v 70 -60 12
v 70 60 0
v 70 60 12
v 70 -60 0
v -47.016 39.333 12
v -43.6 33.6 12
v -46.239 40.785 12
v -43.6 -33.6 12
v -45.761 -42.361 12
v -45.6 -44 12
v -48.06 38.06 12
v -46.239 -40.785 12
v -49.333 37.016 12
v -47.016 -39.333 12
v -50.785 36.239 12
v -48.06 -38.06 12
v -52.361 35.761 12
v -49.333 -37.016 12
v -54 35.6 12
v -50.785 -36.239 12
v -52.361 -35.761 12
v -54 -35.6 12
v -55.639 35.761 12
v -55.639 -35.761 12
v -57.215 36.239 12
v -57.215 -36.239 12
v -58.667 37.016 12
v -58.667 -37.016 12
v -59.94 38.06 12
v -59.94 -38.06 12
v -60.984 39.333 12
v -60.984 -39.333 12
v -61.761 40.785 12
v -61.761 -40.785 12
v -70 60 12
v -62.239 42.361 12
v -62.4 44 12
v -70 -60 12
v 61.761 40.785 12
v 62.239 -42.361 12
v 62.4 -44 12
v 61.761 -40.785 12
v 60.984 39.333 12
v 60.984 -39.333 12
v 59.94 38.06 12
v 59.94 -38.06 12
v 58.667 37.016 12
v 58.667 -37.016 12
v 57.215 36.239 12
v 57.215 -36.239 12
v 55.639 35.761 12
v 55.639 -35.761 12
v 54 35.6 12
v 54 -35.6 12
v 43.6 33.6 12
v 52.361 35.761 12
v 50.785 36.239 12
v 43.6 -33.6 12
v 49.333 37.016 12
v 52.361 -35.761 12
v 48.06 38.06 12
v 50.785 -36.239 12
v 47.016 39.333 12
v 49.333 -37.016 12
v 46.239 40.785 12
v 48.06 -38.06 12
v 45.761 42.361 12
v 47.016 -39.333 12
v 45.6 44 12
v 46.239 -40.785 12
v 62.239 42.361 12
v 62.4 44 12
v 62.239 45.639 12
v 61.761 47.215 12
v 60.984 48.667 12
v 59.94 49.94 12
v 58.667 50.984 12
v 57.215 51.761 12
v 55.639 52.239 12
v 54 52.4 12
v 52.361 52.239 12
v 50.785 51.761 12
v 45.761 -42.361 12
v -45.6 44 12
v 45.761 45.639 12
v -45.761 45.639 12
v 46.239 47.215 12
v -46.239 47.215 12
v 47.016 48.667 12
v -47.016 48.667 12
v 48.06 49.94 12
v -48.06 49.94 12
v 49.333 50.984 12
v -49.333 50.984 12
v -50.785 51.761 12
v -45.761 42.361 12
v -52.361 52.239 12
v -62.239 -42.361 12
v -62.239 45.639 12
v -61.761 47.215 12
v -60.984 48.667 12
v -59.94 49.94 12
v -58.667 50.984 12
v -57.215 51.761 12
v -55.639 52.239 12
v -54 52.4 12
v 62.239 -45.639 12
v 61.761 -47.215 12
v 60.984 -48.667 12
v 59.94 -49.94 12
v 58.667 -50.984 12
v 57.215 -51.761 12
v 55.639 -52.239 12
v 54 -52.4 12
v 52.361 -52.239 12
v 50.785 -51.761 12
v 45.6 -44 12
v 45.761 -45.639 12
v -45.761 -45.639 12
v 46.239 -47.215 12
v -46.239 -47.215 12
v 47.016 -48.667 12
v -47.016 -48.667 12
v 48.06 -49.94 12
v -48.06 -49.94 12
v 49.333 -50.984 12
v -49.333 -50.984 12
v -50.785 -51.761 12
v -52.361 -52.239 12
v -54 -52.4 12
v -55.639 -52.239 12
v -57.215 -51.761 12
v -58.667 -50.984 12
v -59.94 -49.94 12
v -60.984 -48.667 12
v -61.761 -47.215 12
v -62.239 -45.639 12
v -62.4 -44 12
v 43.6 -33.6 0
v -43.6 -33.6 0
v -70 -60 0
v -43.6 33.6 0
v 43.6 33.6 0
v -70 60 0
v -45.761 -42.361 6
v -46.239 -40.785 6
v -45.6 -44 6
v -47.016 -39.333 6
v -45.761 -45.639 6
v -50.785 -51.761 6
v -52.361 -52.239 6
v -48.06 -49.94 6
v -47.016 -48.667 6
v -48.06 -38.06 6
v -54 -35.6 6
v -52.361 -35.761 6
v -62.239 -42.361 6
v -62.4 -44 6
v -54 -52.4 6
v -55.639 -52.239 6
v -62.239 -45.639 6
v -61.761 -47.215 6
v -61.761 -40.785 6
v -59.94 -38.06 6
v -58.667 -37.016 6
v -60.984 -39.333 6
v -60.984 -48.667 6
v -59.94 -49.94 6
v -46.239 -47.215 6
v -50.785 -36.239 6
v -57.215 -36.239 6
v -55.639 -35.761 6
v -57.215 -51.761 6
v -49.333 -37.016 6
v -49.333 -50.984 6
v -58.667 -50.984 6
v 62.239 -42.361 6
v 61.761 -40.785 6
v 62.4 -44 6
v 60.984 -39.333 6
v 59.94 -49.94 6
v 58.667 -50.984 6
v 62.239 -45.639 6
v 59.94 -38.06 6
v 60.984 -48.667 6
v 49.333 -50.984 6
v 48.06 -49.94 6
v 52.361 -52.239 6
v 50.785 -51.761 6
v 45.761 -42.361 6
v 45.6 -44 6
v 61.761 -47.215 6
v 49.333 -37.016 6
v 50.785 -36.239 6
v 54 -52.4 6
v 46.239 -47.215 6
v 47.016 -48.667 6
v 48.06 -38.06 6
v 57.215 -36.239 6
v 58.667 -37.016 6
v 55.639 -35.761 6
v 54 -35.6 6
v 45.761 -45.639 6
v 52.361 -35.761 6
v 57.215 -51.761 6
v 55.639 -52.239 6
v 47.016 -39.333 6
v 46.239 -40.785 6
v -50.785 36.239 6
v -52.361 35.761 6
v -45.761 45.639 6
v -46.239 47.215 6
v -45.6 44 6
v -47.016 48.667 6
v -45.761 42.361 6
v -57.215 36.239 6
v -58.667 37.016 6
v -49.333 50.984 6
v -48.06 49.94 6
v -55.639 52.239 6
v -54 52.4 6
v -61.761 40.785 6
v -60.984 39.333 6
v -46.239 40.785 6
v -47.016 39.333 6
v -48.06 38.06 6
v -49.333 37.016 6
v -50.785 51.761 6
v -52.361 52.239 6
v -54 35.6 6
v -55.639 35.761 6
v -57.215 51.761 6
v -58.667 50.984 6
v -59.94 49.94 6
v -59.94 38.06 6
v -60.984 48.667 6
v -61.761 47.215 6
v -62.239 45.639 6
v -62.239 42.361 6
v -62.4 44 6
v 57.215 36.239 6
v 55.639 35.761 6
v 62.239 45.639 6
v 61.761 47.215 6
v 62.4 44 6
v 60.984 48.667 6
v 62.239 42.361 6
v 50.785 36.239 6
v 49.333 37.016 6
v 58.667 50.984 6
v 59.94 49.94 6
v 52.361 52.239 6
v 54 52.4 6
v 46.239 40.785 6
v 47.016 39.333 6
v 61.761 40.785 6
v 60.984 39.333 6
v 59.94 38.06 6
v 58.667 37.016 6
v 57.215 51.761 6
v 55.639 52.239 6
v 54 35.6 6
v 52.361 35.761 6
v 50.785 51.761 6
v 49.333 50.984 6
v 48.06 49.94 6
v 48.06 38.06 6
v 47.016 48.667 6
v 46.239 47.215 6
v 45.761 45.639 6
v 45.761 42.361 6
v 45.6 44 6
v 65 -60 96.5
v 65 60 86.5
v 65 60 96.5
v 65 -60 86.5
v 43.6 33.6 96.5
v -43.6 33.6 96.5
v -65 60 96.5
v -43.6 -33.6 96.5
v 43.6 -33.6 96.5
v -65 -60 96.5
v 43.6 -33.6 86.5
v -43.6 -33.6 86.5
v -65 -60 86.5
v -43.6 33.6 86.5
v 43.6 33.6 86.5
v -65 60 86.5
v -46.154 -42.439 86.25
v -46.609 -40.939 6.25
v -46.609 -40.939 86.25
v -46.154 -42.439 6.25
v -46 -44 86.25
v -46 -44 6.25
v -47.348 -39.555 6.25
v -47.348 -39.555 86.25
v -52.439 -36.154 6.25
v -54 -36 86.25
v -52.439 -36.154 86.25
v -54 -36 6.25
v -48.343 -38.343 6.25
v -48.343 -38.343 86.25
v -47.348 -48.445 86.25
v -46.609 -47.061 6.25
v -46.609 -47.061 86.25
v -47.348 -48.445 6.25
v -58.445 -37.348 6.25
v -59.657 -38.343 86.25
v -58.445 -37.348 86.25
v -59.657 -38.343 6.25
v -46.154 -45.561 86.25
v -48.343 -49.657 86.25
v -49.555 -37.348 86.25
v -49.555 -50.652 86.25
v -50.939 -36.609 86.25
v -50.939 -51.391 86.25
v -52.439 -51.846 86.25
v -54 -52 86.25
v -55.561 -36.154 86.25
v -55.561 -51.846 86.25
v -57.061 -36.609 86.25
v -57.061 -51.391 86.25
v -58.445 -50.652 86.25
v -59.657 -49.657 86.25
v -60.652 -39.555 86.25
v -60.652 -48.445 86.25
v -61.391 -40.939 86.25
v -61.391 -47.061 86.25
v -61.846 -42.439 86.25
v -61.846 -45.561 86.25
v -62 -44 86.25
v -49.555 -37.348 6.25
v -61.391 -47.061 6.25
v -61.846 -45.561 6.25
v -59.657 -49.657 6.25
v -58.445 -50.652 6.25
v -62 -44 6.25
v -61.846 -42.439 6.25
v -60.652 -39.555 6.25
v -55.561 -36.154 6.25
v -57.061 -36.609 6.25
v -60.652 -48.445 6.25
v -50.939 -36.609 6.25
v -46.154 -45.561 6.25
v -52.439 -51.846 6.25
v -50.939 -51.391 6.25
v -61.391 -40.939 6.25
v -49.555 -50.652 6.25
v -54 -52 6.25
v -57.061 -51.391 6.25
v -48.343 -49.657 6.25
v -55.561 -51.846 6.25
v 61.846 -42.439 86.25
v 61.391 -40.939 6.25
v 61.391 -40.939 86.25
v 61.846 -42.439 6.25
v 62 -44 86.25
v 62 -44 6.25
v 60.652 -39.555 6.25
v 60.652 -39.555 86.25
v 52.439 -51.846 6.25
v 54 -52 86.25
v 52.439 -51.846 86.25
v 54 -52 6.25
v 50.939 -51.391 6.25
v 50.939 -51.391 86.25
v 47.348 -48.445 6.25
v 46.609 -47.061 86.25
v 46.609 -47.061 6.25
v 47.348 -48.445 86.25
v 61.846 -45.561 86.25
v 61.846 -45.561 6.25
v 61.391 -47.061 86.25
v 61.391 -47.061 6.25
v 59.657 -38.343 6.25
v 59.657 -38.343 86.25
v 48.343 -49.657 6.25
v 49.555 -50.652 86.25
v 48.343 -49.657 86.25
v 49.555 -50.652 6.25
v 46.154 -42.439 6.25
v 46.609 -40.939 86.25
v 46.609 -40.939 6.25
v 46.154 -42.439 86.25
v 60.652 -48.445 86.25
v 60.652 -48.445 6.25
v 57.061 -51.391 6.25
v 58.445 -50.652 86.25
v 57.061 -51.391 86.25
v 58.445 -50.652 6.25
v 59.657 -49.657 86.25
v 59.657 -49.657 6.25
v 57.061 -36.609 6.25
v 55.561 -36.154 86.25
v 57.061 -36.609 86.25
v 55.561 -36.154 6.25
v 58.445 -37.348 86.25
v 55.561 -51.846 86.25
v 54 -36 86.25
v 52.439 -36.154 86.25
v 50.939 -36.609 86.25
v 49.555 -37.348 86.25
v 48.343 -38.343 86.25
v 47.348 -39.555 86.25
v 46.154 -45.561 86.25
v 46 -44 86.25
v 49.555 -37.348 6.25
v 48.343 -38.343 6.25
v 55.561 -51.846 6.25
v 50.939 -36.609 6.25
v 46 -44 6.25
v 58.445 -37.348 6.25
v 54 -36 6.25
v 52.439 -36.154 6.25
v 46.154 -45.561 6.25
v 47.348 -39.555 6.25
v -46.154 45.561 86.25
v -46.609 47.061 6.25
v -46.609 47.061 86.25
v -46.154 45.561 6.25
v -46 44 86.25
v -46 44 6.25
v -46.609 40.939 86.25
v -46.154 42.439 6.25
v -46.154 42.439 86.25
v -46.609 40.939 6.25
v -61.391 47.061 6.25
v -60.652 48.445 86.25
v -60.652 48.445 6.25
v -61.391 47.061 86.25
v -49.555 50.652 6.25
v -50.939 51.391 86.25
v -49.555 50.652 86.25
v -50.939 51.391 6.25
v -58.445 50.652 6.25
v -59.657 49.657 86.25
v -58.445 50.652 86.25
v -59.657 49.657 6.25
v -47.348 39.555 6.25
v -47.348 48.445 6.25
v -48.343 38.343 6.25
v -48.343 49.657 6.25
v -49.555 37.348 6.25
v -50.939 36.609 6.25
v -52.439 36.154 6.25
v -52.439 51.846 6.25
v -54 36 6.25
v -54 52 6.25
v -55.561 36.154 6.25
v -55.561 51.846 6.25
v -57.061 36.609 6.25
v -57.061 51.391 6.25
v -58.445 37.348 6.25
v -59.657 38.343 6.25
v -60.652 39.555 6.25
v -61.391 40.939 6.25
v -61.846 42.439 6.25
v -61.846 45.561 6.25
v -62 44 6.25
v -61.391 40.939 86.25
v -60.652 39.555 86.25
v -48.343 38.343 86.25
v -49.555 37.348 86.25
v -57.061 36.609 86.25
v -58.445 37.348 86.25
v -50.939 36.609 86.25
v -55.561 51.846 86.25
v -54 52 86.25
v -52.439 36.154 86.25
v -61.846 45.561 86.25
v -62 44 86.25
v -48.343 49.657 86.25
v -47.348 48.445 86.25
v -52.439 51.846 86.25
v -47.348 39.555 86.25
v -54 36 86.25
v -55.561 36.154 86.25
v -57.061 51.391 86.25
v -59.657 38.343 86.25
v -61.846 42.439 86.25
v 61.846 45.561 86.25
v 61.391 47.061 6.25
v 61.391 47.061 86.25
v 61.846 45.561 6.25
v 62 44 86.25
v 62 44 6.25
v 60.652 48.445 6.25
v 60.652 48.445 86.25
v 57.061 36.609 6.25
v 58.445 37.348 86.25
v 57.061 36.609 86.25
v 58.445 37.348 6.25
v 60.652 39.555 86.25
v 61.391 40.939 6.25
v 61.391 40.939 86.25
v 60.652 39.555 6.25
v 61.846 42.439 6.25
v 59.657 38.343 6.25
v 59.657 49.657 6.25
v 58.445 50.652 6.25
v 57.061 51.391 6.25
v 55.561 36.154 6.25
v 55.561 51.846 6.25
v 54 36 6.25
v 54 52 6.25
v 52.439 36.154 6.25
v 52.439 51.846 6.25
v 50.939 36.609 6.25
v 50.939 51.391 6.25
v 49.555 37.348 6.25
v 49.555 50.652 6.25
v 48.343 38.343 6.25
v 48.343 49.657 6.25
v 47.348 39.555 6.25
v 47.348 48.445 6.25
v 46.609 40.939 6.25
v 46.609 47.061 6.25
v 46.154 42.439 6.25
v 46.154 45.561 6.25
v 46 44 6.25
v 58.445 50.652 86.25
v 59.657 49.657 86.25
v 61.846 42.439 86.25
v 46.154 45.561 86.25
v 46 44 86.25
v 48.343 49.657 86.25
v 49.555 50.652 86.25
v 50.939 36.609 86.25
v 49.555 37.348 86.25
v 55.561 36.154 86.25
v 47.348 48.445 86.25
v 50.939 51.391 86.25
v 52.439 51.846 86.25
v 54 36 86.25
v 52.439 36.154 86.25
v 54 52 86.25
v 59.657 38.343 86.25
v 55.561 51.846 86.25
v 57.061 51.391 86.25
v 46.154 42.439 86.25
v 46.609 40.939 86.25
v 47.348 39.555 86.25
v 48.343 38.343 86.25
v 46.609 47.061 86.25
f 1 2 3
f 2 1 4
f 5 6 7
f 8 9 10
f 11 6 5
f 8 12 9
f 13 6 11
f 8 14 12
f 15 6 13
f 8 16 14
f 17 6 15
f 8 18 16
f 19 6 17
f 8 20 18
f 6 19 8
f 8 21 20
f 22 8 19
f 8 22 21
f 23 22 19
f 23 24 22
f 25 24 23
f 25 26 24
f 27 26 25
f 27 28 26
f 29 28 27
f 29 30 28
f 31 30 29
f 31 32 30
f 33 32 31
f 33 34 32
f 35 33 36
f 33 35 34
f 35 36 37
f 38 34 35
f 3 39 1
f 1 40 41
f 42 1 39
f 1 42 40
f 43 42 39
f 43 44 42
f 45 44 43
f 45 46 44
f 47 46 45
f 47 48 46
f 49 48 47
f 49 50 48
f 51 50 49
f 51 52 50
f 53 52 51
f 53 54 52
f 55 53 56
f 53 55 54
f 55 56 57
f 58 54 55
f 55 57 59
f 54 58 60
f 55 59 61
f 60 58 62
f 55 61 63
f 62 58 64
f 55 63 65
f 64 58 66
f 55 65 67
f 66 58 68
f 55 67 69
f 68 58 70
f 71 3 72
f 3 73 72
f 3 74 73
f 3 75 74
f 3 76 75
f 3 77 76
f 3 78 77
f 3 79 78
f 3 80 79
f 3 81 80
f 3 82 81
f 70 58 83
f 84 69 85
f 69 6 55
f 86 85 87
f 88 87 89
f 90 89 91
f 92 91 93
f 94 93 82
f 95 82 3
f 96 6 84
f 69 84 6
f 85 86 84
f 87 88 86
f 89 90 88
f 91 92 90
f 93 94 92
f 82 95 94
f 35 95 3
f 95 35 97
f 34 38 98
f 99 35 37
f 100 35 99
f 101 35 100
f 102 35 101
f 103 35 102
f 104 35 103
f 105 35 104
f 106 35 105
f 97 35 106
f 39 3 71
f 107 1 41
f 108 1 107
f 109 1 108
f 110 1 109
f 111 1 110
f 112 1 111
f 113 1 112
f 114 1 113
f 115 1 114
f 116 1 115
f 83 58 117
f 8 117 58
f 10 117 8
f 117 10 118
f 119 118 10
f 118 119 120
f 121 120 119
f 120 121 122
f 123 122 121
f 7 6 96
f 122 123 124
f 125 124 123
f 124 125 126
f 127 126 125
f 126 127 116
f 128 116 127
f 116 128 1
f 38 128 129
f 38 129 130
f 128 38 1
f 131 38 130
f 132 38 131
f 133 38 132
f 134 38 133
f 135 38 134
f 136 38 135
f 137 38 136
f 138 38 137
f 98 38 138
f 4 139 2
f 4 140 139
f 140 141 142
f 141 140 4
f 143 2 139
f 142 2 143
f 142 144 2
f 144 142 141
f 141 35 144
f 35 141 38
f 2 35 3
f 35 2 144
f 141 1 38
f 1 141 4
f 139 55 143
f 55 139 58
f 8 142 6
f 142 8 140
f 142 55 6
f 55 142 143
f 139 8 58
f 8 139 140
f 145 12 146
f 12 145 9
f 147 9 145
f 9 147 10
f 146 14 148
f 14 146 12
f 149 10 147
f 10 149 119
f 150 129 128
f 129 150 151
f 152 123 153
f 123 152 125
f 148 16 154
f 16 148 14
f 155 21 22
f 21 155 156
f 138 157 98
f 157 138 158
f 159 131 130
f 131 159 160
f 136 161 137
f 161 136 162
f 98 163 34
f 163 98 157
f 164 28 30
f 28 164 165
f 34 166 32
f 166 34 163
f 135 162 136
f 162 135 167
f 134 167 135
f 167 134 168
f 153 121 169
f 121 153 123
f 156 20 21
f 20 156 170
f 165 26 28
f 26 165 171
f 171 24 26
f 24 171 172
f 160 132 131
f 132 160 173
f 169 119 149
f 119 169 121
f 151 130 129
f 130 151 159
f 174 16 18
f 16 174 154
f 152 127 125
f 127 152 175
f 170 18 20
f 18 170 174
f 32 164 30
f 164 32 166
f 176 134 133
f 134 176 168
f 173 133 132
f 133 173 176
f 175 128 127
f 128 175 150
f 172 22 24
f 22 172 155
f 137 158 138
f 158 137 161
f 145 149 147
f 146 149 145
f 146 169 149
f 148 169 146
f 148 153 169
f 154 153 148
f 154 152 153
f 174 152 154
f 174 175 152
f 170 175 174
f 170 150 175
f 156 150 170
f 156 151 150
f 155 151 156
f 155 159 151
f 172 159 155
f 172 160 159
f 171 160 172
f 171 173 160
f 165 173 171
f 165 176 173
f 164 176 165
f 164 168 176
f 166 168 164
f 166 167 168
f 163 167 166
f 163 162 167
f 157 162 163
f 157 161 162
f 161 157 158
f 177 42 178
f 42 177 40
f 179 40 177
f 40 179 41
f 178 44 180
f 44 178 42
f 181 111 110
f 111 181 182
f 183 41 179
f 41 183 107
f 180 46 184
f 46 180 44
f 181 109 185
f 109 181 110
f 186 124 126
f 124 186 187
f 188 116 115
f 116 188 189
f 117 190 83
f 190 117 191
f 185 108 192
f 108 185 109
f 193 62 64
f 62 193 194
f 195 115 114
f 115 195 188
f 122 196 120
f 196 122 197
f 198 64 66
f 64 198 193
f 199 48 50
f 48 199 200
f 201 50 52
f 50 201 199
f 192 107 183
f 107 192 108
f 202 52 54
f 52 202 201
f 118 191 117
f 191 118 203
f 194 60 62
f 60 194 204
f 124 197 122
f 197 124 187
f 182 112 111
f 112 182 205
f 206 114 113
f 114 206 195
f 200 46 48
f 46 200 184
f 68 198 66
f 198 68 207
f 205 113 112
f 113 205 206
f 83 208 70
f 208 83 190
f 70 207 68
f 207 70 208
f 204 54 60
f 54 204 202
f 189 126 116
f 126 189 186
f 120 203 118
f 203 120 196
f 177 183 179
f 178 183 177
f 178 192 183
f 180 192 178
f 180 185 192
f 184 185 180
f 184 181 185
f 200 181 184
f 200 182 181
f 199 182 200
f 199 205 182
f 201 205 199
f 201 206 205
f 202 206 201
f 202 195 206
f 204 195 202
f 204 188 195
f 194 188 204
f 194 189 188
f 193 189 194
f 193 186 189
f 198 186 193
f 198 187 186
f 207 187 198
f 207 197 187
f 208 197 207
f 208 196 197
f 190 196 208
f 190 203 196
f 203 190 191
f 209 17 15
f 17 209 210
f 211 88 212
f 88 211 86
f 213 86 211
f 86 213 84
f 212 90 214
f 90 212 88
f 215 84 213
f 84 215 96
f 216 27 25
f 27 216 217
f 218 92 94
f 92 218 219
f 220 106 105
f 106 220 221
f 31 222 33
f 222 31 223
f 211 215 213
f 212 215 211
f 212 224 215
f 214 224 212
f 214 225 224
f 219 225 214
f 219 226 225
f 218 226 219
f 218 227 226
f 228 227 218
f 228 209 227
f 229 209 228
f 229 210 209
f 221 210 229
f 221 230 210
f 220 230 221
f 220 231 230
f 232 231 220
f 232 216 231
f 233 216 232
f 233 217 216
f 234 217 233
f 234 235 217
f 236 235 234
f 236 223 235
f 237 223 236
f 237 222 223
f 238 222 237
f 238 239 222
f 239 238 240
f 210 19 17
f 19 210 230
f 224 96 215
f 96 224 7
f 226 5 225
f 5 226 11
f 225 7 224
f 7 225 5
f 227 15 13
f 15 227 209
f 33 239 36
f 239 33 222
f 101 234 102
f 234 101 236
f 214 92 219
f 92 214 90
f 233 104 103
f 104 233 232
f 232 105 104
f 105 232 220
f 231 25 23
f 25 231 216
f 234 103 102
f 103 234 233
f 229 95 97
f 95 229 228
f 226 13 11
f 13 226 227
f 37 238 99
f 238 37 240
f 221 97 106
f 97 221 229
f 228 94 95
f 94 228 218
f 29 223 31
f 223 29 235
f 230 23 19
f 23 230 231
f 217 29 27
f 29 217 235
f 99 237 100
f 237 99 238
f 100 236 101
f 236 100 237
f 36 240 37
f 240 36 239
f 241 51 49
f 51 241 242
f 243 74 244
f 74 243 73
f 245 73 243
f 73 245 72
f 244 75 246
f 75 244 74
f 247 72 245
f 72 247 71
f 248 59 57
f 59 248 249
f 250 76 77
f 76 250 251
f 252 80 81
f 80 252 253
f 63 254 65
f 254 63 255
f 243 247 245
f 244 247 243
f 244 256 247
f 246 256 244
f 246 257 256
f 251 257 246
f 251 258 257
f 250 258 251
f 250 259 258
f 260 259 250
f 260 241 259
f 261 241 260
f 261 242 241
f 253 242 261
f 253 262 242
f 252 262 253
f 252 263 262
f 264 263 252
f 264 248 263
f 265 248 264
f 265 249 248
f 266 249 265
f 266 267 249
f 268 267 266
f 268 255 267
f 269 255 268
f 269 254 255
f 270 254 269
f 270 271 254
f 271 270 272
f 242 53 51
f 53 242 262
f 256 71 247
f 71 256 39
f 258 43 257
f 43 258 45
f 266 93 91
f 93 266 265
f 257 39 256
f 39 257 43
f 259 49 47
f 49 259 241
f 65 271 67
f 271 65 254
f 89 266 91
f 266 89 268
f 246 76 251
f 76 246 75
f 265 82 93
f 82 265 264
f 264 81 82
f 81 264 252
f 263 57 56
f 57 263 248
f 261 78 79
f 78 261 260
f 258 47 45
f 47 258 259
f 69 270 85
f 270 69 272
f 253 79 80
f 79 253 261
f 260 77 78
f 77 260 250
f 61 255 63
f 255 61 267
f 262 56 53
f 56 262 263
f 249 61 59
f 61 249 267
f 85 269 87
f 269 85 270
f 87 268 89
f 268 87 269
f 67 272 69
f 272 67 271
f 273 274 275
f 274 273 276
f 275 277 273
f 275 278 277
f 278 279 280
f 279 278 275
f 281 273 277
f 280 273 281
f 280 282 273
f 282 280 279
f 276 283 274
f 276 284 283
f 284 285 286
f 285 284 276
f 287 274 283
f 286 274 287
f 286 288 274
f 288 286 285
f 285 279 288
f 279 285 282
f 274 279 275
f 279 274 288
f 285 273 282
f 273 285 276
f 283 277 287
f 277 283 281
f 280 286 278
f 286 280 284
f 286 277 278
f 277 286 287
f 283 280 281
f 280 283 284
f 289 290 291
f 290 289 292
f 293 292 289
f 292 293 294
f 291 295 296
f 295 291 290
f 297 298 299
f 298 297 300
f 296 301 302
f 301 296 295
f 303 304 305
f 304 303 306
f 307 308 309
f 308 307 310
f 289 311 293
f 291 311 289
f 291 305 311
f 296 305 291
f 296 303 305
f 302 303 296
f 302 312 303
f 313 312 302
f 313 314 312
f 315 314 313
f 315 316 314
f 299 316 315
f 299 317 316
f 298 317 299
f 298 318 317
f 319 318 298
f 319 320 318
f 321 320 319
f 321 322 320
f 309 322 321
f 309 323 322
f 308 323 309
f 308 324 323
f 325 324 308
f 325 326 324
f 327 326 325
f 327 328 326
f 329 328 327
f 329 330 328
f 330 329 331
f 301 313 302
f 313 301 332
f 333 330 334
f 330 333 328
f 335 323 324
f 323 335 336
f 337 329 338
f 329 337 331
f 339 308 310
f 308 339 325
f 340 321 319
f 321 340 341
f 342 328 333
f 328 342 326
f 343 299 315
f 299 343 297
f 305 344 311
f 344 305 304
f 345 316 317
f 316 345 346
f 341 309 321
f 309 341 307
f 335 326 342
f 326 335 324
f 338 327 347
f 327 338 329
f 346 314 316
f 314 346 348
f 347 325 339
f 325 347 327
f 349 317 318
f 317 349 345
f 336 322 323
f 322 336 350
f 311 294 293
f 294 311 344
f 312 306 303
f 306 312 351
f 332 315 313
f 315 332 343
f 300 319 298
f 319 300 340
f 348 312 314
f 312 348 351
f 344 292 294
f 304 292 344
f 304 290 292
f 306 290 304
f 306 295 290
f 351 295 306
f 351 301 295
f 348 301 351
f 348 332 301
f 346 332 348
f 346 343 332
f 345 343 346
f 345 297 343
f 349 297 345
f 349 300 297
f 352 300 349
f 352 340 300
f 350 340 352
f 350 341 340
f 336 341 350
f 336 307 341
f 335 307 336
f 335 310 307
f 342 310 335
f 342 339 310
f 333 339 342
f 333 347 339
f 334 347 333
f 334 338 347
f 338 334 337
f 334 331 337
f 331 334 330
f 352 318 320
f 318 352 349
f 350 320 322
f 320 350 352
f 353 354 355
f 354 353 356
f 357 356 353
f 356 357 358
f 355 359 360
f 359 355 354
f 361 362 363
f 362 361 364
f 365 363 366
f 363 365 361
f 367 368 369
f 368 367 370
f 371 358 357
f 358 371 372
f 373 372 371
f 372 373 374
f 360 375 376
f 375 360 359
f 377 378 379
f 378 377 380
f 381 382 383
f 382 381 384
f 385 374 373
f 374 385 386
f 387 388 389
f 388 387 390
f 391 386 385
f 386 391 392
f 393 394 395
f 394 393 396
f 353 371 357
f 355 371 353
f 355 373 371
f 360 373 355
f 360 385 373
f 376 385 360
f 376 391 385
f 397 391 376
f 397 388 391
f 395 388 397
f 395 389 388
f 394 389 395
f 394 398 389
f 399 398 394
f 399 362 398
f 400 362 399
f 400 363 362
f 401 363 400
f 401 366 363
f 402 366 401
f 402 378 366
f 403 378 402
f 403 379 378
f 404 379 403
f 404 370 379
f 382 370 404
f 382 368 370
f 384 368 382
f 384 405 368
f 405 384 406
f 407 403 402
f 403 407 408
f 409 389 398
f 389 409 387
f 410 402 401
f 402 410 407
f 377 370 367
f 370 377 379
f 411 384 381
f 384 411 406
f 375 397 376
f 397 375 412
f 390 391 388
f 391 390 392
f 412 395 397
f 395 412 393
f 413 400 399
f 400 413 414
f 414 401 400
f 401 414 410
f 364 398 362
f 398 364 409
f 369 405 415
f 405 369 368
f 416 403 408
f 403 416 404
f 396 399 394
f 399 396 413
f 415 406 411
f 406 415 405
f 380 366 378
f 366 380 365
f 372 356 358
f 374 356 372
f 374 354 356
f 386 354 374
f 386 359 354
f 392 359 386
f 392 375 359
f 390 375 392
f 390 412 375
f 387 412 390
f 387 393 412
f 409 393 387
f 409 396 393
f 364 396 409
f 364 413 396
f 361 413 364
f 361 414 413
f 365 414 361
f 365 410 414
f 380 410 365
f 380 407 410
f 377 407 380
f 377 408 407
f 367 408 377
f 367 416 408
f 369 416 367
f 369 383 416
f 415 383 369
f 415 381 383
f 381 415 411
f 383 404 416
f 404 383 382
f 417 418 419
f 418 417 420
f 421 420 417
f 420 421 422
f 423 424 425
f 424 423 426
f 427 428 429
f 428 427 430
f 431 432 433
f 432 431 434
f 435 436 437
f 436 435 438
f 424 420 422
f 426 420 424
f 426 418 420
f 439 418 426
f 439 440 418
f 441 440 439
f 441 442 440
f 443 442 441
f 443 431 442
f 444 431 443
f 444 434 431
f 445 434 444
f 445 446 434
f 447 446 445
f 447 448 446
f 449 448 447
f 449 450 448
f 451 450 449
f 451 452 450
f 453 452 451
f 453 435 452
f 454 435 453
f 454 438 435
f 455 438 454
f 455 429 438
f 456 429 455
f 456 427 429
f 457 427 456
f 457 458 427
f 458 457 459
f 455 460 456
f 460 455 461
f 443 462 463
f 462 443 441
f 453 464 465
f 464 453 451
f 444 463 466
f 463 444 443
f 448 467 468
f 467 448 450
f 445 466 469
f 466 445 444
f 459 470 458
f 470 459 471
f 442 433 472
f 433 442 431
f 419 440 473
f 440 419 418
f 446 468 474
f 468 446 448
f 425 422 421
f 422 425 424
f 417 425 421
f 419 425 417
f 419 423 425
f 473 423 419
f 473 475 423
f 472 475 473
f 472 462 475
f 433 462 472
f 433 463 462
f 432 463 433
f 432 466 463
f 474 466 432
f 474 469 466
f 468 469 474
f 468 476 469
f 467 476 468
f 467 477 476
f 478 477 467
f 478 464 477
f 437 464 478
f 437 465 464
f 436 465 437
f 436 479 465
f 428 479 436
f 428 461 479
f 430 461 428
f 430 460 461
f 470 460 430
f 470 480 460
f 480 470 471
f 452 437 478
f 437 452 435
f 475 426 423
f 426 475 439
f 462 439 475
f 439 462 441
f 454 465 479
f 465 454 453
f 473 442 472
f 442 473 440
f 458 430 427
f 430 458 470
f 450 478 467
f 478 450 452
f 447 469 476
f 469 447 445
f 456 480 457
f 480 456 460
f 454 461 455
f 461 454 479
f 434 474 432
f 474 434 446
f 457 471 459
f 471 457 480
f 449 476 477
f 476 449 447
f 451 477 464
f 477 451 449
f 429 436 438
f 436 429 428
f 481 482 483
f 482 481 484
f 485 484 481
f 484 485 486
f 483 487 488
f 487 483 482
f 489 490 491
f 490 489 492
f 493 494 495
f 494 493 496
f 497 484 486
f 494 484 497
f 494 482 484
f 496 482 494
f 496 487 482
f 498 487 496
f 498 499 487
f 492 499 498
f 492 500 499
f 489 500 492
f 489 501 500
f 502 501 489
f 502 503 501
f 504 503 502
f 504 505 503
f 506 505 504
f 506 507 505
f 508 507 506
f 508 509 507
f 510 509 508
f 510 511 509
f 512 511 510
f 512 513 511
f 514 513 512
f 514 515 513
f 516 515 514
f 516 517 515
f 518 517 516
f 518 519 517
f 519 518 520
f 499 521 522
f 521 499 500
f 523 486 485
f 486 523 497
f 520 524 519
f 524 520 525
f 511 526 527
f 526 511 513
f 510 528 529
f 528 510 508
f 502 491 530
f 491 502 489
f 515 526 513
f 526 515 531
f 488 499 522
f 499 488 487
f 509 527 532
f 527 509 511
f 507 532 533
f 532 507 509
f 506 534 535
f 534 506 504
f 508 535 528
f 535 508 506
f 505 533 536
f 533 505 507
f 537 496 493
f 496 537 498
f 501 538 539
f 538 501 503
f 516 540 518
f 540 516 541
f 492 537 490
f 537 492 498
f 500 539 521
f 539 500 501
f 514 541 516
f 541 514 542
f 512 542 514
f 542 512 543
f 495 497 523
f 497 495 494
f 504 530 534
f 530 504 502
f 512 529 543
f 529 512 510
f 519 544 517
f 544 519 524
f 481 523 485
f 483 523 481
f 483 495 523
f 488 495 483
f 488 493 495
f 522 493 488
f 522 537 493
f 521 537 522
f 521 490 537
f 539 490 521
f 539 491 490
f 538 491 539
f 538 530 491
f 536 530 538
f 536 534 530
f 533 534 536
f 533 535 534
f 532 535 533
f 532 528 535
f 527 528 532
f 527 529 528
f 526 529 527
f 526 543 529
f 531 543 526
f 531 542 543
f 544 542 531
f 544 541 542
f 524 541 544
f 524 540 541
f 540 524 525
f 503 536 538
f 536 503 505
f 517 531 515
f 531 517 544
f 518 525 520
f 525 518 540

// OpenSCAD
$fn = 32;

// ------------------------------------------------------------------------
// Frame cube: base 140 x 120 mm, posts 80 mm tall
// Every part is its own module, assembly() places every instance.
// ------------------------------------------------------------------------

// --- part 1 ---
module base_frame() {
  difference() {
    translate([-70, -60, 0]) cube([140, 120, 12]);
    translate([-43.6, -33.6, -1]) cube([87.2, 67.2, 14]);
    translate([-54, -44, 6]) cylinder(h = 7, d = 16.8);
    translate([54, -44, 6]) cylinder(h = 7, d = 16.8);
    translate([-54, 44, 6]) cylinder(h = 7, d = 16.8);
    translate([54, 44, 6]) cylinder(h = 7, d = 16.8);
  }
}

// --- part 2 ---
module corner_post() {
  cylinder(h = 80, d = 16);
}

// --- part 3 ---
module top_frame() {
  difference() {
    translate([-65, -60, 0]) cube([130, 120, 10]);
    translate([-43.6, -33.6, -1]) cube([87.2, 67.2, 12]);
  }
}

// --- assembly ---
module assembly() {
  color([0.80, 0.24, 0.20]) translate([0, 0, 0]) rotate([0, 0, 0]) base_frame();
  color([0.20, 0.45, 0.75]) translate([-54, -44, 6.25]) rotate([0, 0, 0]) corner_post();
  color([0.25, 0.62, 0.32]) translate([54, -44, 6.25]) rotate([0, 0, 0]) corner_post();
  color([0.92, 0.70, 0.18]) translate([-54, 44, 6.25]) rotate([0, 0, 0]) corner_post();
  color([0.58, 0.35, 0.70]) translate([54, 44, 6.25]) rotate([0, 0, 0]) corner_post();
  color([0.16, 0.66, 0.66]) translate([0, 0, 86.5]) rotate([0, 0, 0]) top_frame();
}

assembly();
